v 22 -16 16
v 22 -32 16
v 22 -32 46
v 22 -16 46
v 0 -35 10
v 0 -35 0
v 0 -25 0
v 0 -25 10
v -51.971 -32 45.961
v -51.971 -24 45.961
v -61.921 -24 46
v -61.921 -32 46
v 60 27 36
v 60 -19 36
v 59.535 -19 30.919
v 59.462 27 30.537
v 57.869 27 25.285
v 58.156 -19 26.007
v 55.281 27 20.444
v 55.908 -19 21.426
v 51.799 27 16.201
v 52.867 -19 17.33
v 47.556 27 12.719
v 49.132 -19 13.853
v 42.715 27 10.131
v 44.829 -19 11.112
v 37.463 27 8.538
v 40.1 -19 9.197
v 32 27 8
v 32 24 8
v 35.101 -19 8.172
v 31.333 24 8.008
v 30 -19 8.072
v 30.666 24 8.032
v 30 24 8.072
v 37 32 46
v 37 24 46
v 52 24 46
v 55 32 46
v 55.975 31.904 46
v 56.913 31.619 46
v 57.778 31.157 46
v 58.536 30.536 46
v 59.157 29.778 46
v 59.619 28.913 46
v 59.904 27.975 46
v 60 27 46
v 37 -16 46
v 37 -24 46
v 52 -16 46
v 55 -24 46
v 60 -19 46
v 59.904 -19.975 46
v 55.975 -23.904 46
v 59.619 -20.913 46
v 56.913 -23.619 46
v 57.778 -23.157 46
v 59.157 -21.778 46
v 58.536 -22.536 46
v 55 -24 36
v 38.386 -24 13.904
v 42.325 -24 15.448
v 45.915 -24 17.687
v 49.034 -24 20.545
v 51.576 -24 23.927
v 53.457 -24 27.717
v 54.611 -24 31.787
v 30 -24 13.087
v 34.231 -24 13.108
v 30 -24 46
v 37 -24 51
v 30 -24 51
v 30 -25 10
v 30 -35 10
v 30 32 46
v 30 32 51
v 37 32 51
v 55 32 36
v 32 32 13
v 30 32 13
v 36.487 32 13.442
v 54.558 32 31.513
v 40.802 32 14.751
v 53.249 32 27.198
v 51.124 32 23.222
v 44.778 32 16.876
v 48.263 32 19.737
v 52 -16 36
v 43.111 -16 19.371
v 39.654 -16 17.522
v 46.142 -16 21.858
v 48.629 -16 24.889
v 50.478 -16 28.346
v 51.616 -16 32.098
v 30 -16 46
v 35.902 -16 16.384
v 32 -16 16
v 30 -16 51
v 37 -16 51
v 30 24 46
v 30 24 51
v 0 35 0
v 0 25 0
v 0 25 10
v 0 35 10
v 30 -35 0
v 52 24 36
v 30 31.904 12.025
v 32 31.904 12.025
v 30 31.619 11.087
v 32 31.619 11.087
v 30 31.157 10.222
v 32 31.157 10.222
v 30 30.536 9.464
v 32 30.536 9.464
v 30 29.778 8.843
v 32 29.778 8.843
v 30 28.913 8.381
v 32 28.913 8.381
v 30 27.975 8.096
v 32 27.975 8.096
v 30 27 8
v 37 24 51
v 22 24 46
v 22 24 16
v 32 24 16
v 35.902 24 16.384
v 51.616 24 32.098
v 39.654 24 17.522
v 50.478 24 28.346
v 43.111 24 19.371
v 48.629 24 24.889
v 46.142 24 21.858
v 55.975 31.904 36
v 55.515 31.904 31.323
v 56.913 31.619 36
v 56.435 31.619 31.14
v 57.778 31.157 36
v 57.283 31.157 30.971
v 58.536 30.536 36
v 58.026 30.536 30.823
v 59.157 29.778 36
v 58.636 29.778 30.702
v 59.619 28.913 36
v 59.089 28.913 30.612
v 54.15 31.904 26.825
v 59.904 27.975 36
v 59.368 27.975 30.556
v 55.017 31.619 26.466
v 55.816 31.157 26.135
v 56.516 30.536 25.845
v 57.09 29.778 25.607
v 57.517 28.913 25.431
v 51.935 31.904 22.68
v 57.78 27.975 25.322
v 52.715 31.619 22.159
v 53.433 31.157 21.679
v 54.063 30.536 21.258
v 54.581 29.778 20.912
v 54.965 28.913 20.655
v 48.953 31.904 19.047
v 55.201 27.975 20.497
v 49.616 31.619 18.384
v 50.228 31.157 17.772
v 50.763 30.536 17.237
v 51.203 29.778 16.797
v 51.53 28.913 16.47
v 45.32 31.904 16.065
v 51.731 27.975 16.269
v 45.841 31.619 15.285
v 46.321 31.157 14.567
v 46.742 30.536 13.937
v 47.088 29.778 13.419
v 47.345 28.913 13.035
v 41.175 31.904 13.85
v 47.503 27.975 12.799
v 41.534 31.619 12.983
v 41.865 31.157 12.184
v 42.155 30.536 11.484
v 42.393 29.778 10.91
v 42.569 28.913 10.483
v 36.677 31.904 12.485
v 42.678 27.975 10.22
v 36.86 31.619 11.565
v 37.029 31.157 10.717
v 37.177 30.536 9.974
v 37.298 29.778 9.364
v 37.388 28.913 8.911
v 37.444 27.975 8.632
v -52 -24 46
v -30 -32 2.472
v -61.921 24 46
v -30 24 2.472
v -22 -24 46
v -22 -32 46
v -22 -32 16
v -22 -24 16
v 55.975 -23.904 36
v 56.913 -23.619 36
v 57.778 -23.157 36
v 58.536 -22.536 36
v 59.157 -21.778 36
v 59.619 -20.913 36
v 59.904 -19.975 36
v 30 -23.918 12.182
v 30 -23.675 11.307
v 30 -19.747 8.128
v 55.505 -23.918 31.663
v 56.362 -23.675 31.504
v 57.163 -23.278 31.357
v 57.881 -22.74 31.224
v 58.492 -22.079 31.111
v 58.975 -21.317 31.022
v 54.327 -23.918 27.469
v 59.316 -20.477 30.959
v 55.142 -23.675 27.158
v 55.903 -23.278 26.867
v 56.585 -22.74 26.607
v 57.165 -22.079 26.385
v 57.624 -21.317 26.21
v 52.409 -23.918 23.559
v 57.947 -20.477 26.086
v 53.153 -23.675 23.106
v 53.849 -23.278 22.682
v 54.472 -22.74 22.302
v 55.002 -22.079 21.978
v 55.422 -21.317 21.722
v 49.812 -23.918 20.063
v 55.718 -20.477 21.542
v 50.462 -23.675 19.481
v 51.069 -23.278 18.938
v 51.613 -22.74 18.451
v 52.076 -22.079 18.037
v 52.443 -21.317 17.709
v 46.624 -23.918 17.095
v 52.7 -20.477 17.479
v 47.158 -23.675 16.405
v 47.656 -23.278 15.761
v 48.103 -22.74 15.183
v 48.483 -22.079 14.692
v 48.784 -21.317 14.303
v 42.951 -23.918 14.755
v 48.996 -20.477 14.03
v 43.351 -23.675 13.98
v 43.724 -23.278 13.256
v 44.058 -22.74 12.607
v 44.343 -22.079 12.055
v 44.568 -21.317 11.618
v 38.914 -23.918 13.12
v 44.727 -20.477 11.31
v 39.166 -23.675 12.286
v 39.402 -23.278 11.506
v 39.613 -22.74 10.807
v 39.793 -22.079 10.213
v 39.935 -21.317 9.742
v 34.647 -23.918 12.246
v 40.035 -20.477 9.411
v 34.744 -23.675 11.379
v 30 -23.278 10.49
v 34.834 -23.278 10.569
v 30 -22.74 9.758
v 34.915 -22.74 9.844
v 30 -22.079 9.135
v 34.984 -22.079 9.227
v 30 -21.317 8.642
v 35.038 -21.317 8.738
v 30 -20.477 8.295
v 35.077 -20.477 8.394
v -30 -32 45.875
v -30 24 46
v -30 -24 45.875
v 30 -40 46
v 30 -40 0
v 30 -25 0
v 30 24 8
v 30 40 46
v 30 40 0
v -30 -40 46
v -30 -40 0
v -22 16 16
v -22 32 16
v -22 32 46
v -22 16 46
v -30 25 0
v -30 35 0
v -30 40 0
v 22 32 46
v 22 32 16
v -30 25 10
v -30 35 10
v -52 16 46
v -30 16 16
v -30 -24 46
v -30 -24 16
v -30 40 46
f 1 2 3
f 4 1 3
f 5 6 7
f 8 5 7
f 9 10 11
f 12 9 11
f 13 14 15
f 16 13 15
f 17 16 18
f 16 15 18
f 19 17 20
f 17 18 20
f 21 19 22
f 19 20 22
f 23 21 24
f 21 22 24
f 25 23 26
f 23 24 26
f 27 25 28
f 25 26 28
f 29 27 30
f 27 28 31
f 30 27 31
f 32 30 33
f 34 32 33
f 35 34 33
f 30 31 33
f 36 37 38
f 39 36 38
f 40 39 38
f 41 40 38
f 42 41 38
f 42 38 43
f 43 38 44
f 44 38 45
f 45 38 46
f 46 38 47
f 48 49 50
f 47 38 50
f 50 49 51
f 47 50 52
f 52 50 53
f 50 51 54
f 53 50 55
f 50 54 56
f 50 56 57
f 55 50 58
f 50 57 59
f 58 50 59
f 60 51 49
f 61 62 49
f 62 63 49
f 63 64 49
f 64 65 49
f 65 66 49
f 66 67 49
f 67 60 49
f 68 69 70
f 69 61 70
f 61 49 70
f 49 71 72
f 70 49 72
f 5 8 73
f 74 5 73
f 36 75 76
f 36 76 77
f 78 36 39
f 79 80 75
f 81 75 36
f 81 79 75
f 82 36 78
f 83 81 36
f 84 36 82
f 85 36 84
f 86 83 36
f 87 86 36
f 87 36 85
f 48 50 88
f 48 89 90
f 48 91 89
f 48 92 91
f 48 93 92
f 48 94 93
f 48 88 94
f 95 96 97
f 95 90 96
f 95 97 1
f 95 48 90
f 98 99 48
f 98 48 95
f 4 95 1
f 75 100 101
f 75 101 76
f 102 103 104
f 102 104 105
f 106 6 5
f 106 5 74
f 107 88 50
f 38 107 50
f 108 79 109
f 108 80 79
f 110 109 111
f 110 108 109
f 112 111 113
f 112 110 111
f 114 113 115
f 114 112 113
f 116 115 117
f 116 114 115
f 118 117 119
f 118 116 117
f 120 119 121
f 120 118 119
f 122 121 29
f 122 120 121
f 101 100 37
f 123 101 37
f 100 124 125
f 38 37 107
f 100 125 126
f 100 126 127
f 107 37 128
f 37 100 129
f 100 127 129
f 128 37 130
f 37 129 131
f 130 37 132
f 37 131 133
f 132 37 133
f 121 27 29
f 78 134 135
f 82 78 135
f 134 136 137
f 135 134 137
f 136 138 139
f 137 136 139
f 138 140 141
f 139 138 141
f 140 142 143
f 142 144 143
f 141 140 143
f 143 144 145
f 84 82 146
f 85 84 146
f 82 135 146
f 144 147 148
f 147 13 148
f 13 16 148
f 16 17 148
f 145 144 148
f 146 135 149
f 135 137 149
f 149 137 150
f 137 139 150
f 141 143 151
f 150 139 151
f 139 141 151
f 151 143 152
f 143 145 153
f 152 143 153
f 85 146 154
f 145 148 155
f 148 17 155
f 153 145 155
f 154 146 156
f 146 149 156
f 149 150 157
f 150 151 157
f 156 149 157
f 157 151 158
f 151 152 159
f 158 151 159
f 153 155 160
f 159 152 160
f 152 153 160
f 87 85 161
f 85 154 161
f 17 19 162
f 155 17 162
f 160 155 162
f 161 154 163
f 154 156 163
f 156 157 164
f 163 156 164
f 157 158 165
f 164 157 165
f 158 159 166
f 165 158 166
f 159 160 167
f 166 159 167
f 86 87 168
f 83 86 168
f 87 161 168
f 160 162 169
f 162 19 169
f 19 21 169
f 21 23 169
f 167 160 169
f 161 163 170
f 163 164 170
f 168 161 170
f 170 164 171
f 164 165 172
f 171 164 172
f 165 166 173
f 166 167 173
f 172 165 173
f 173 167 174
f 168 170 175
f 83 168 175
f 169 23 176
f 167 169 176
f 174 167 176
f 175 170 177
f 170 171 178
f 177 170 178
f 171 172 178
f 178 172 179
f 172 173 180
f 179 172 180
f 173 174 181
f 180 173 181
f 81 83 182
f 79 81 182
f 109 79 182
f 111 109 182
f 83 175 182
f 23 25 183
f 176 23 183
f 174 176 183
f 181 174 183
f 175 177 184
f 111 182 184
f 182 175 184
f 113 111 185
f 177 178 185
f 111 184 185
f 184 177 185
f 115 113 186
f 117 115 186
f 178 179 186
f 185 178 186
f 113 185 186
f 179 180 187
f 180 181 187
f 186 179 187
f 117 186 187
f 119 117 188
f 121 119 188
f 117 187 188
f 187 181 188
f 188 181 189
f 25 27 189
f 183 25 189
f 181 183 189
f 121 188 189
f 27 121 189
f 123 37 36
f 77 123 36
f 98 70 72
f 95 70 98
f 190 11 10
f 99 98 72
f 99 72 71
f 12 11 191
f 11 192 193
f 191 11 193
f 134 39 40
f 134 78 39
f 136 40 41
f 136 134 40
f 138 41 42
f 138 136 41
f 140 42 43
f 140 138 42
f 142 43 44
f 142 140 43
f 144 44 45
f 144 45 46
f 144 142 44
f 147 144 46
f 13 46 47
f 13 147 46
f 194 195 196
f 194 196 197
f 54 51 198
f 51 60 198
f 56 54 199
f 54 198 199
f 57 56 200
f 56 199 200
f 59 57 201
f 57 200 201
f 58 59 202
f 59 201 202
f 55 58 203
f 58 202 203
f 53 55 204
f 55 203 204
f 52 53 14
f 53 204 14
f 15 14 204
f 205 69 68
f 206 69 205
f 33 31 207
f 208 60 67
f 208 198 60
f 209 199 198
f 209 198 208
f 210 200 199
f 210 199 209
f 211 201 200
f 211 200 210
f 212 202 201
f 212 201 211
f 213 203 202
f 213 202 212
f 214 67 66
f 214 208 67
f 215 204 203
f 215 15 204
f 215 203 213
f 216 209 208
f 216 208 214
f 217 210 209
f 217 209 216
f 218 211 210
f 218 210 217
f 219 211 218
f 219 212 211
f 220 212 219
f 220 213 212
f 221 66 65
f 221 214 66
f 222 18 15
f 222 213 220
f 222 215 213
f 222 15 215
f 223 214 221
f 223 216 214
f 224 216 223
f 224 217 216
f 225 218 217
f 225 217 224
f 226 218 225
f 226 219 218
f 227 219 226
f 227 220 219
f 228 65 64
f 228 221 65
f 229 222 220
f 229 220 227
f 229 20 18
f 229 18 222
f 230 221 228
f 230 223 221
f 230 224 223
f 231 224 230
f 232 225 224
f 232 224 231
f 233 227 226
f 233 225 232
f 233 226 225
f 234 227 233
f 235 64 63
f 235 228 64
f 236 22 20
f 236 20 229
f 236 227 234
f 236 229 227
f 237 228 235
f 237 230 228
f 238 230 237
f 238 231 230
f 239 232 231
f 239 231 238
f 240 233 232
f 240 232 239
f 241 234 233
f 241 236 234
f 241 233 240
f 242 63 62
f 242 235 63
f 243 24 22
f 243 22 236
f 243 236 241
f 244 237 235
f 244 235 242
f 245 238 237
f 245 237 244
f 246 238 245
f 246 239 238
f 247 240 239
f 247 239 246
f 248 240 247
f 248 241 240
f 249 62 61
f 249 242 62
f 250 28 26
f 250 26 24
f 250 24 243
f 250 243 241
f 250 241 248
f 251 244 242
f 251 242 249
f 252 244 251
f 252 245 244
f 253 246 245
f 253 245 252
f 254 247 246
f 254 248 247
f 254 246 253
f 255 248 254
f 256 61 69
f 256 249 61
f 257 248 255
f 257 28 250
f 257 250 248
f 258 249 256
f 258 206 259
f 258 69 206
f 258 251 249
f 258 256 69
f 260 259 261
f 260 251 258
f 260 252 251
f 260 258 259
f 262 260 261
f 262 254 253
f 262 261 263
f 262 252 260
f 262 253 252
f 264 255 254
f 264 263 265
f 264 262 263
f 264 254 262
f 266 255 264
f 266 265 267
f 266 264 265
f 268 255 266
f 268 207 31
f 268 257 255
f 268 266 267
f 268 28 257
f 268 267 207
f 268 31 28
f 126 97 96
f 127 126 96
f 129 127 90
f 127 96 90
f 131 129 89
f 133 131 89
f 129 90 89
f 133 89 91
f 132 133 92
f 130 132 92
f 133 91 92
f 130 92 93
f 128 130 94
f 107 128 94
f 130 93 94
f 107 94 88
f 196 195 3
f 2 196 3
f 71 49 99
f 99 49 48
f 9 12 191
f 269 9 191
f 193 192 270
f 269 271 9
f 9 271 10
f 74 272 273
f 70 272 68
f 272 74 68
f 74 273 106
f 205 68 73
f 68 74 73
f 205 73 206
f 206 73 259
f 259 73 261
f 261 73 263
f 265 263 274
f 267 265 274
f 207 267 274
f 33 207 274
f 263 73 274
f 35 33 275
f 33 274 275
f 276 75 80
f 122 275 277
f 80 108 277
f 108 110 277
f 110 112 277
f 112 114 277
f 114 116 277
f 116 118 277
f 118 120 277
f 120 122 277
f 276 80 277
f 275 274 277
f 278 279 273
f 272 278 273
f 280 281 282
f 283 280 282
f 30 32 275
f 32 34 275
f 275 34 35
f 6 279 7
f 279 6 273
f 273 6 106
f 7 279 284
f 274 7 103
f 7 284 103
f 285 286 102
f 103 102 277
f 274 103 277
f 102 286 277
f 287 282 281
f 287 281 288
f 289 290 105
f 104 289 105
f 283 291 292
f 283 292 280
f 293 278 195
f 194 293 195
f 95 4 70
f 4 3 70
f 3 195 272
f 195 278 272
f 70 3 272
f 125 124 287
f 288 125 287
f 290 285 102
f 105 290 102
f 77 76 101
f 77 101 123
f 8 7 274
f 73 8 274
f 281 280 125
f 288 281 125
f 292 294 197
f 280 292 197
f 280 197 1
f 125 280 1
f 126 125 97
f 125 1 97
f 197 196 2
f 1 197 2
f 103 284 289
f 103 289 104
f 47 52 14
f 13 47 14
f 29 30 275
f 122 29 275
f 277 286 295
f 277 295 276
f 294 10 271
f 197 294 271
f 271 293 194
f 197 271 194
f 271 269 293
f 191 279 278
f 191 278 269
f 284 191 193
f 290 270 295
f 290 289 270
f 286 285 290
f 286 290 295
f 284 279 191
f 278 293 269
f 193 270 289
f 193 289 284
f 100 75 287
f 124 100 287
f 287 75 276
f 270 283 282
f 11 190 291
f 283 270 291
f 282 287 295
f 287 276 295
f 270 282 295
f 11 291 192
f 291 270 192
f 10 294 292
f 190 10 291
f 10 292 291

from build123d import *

# Parameters (mm, degrees)
F0_W      = 60
F0_H      = 80
F2_DEPTH  = 46
F1_W      = 30
F1_H      = 10
F3_DEPTH  = 10
F4_W      = 44
F4_H      = 64
F5_DEPTH  = 30
F6_W      = 8
F6_H      = 48
F7_DEPTH  = 30
F8_W      = 22
F8_H      = 30
F8_W_2    = 8
F9_DEPTH  = 8
F10_R     = 20
F12_DEPTH = 8
F14_DEPTH = 40
F15_R     = 5
F17_DEPTH = 8
F18_R     = 5
F19_W     = 7
F19_H     = 8
F20_DEPTH = 5
F21_W     = 22
F21_H     = 30
F21_W_2   = 8
F22_DEPTH = 8
F23_SIZE2 = 29.99999
F23_SIZE  = 21.99999
F25_DEPTH = 8
F27_DEPTH = 40
F29_DEPTH = 8


# Not quite as in the source:
# - a fillet or chamfer is up to 0.001 mm smaller than in the source, because OpenCascade refuses the exact size


with BuildPart() as f2:
    # F0 (on Top) → F2 (new body)
    with BuildSketch(Plane.XY):
        Rectangle(F0_W, F0_H)
    extrude(amount=F2_DEPTH)

    # F1 (on face) → F3 (cut)
    with BuildSketch(Plane.XY):
        with Locations((-15, 30)):
            Rectangle(F1_W, F1_H)
        with Locations((15, -30)):
            Rectangle(F1_W, F1_H)
    extrude(amount=F3_DEPTH, mode=Mode.SUBTRACT)

    # F4 (on face) → F5 (cut)
    with BuildSketch(Plane.XY.offset(46)):
        Rectangle(F4_W, F4_H)
    extrude(amount=-F5_DEPTH, mode=Mode.SUBTRACT)

    # F6 (on face) → F7 (cut, through all)
    with BuildSketch(Plane.XY.offset(46)):
        with Locations((-26, 0)):
            Rectangle(F6_W, F6_H)
        with Locations((26, 0)):
            Rectangle(F6_W, F6_H)
    extrude(amount=-F7_DEPTH, mode=Mode.SUBTRACT)

    # F8 (on face) → F9 (join)
    with BuildSketch(Plane(origin=(0, -24, 0), x_dir=(-1, 0, 0), z_dir=(0, 1, 0))):
        with Locations((-41, 31)):
            Rectangle(F8_W, F8_H)
        with Locations((-26, 31)):
            Rectangle(F8_W_2, F8_H)
    extrude(amount=F9_DEPTH)

    # F10
    f10_edges = [f2.edges().sort_by_distance(p)[0] for p in [
        (52, -20, 16),
    ]]
    fillet(f10_edges, radius=F10_R)

    # F11 (on face) → F12 (join, through all)
    with BuildSketch(Plane(origin=(0, -16, 0), x_dir=(-1, 0, 0), z_dir=(0, 1, 0))):
        with BuildLine():
            ThreePointArc((-58.1533936612, 46), (-59.5344785906, 41.08453427), (-60, 36))
            ThreePointArc((-60, 36), (-51.7989898732, 16.2010101268), (-32, 8))
            Line((-32, 8), (-32, 16))
            ThreePointArc((-32, 16), (-46.1421356237, 21.8578643763), (-52, 36))
            Line((-52, 36), (-52, 46))
            Line((-52, 46), (-58.1533936612, 46))
        make_face()
        with BuildLine():
            Line((-60, 46), (-60, 36))
            ThreePointArc((-60, 36), (-59.5344785906, 41.08453427), (-58.1533936612, 46))
            Line((-58.1533936612, 46), (-60, 46))
        make_face()
        with BuildLine():
            Line((-32, 16), (-32, 8))
            ThreePointArc((-32, 8), (-30.999360817, 8.0178856906), (-30, 8.0715199125))
            Line((-30, 8.0715199125), (-30, 16))
            Line((-30, 16), (-32, 16))
        make_face()
    extrude(amount=-F12_DEPTH)

    # F13 (on face) → F14 (join, through all)
    with BuildSketch(Plane(origin=(0, -16, 0), x_dir=(-1, 0, 0), z_dir=(0, 1, 0))):
        with BuildLine():
            ThreePointArc((-58.1533936612, 46), (-59.5344785906, 41.08453427), (-60, 36))
            Line((-60, 36), (-52, 36))
            Line((-52, 36), (-52, 46))
            Line((-52, 46), (-58.1533936612, 46))
        make_face()
        with BuildLine():
            Line((-60, 46), (-60, 36))
            ThreePointArc((-60, 36), (-59.5344785906, 41.08453427), (-58.1533936612, 46))
            Line((-58.1533936612, 46), (-60, 46))
        make_face()
        with BuildLine():
            Line((-52, 36), (-60, 36))
            ThreePointArc((-60, 36), (-51.7989898732, 16.2010101268), (-32, 8))
            Line((-32, 8), (-32, 16))
            ThreePointArc((-32, 16), (-46.1421356237, 21.8578643763), (-52, 36))
        make_face()
        with BuildLine():
            Line((-32, 16), (-32, 8))
            ThreePointArc((-32, 8), (-30.999360817, 8.0178856906), (-30, 8.0715199125))
            Line((-30, 8.0715199125), (-30, 16))
            Line((-30, 16), (-32, 16))
        make_face()
    extrude(amount=F14_DEPTH)

    # F15
    f15_edges = [f2.edges().sort_by_distance(p)[0] for p in [
        (51.078784, -24, 15.506098),
    ]]
    fillet(f15_edges, radius=F15_R)

    # F16 (on face) → F17 (join)
    with BuildSketch(Plane(origin=(0, 24, 0), x_dir=(-1, 0, 0), z_dir=(0, 1, 0))):
        with BuildLine():
            ThreePointArc((-30, 8.0715199125), (-30.999360817, 8.0178856906), (-32, 8))
            Line((-32, 8), (-30, 8))
            Line((-30, 8), (-30, 8.0715199125))
        make_face()
        with BuildLine():
            Line((-30, 16), (-32, 16))
            Line((-32, 16), (-32, 8))
            ThreePointArc((-32, 8), (-30.999360817, 8.0178856906), (-30, 8.0715199125))
            Line((-30, 8.0715199125), (-30, 16))
        make_face()
        with BuildLine():
            ThreePointArc((-32, 16), (-46.1421356237, 21.8578643763), (-52, 36))
            Line((-52, 36), (-60, 36))
            ThreePointArc((-60, 36), (-51.7989898732, 16.2010101268), (-32, 8))
            Line((-32, 8), (-32, 16))
        make_face()
        with BuildLine():
            Line((-60, 46), (-60, 36))
            ThreePointArc((-60, 36), (-59.5344785906, 41.08453427), (-58.1533936612, 46))
            Line((-58.1533936612, 46), (-60, 46))
        make_face()
        with BuildLine():
            Line((-60, 36), (-52, 36))
            Line((-52, 36), (-52, 46))
            Line((-52, 46), (-58.1533936612, 46))
            ThreePointArc((-58.1533936612, 46), (-59.5344785906, 41.08453427), (-60, 36))
        make_face()
        with BuildLine():
            ThreePointArc((-30, 16.1002512579), (-30.9987444988, 16.0250785378), (-32, 16))
            Line((-32, 16), (-30, 16))
            Line((-30, 16), (-30, 16.1002512579))
        make_face()
        with BuildLine():
            ThreePointArc((-49.3205080757, 46), (-51.3185165258, 41.1763809021), (-52, 36))
            ThreePointArc((-52, 36), (-46.1421356237, 21.8578643763), (-32, 16))
            ThreePointArc((-32, 16), (-30.9987444988, 16.0250785378), (-30, 16.1002512579))
            Line((-30, 16.1002512579), (-30, 46))
            Line((-30, 46), (-49.3205080757, 46))
        make_face()
        with BuildLine():
            Line((-52, 46), (-52, 36))
            ThreePointArc((-52, 36), (-51.3185165258, 41.1763809021), (-49.3205080757, 46))
            Line((-49.3205080757, 46), (-52, 46))
        make_face()
    extrude(amount=F17_DEPTH)

    # F18
    f18_edges = [f2.edges().sort_by_distance(p)[0] for p in [
        (51.79899, 32, 16.20101),
    ]]
    fillet(f18_edges, radius=F18_R)

    # F19 (on face) → F20 (join)
    with BuildSketch(Plane.XY.offset(46)):
        with Locations((33.5, 28)):
            Rectangle(F19_W, F19_H)
        with Locations((33.5, -20)):
            Rectangle(F19_W, F19_H)
    extrude(amount=F20_DEPTH)

    # F21 (on face) → F22 (join)
    with BuildSketch(Plane.XZ.offset(-24)):
        with Locations((-41, 31)):
            Rectangle(F21_W, F21_H)
        with Locations((-26, 31)):
            Rectangle(F21_W_2, F21_H)
    extrude(amount=F22_DEPTH)

    # F23 (size 22 and 30 in the source; OpenCascade refuses exactly that, so slightly less here)
    f23_edges = [f2.edges().sort_by_distance(p)[0] for p in [
        (-52, 20, 16),
    ]]
    f23_side = f2.faces().sort_by_distance((-41, 20, 16))[0]
    chamfer(f23_edges, length=F23_SIZE, length2=F23_SIZE2, reference=f23_side)

    # F24 (on face) → F25 (join)
    with BuildSketch(Plane.XZ.offset(-16)):
        Polygon((-30, 16), (-52, 46), (-61.9205734601, 46), (-30, 2.4719452816), align=None)
    extrude(amount=-F25_DEPTH)

    # F26 (on face) → F27 (join, through all)
    with BuildSketch(Plane.XZ.offset(-16)):
        Polygon((-61.9205734601, 46), (-30, 2.4719452816), (-30, 16), (-52, 46), align=None)
    extrude(amount=F27_DEPTH)

    # F28 (on face) → F29 (join)
    with BuildSketch(Plane.XZ.offset(24)):
        Polygon((-51.9714293201, 45.961039982), (-30, 16), (-30, 45.8750016987), align=None)
        Polygon((-61.9205734601, 46), (-30, 2.4719452816), (-30, 16), (-51.9714293201, 45.961039982), align=None)
    extrude(amount=F29_DEPTH)


solid = f2.part
